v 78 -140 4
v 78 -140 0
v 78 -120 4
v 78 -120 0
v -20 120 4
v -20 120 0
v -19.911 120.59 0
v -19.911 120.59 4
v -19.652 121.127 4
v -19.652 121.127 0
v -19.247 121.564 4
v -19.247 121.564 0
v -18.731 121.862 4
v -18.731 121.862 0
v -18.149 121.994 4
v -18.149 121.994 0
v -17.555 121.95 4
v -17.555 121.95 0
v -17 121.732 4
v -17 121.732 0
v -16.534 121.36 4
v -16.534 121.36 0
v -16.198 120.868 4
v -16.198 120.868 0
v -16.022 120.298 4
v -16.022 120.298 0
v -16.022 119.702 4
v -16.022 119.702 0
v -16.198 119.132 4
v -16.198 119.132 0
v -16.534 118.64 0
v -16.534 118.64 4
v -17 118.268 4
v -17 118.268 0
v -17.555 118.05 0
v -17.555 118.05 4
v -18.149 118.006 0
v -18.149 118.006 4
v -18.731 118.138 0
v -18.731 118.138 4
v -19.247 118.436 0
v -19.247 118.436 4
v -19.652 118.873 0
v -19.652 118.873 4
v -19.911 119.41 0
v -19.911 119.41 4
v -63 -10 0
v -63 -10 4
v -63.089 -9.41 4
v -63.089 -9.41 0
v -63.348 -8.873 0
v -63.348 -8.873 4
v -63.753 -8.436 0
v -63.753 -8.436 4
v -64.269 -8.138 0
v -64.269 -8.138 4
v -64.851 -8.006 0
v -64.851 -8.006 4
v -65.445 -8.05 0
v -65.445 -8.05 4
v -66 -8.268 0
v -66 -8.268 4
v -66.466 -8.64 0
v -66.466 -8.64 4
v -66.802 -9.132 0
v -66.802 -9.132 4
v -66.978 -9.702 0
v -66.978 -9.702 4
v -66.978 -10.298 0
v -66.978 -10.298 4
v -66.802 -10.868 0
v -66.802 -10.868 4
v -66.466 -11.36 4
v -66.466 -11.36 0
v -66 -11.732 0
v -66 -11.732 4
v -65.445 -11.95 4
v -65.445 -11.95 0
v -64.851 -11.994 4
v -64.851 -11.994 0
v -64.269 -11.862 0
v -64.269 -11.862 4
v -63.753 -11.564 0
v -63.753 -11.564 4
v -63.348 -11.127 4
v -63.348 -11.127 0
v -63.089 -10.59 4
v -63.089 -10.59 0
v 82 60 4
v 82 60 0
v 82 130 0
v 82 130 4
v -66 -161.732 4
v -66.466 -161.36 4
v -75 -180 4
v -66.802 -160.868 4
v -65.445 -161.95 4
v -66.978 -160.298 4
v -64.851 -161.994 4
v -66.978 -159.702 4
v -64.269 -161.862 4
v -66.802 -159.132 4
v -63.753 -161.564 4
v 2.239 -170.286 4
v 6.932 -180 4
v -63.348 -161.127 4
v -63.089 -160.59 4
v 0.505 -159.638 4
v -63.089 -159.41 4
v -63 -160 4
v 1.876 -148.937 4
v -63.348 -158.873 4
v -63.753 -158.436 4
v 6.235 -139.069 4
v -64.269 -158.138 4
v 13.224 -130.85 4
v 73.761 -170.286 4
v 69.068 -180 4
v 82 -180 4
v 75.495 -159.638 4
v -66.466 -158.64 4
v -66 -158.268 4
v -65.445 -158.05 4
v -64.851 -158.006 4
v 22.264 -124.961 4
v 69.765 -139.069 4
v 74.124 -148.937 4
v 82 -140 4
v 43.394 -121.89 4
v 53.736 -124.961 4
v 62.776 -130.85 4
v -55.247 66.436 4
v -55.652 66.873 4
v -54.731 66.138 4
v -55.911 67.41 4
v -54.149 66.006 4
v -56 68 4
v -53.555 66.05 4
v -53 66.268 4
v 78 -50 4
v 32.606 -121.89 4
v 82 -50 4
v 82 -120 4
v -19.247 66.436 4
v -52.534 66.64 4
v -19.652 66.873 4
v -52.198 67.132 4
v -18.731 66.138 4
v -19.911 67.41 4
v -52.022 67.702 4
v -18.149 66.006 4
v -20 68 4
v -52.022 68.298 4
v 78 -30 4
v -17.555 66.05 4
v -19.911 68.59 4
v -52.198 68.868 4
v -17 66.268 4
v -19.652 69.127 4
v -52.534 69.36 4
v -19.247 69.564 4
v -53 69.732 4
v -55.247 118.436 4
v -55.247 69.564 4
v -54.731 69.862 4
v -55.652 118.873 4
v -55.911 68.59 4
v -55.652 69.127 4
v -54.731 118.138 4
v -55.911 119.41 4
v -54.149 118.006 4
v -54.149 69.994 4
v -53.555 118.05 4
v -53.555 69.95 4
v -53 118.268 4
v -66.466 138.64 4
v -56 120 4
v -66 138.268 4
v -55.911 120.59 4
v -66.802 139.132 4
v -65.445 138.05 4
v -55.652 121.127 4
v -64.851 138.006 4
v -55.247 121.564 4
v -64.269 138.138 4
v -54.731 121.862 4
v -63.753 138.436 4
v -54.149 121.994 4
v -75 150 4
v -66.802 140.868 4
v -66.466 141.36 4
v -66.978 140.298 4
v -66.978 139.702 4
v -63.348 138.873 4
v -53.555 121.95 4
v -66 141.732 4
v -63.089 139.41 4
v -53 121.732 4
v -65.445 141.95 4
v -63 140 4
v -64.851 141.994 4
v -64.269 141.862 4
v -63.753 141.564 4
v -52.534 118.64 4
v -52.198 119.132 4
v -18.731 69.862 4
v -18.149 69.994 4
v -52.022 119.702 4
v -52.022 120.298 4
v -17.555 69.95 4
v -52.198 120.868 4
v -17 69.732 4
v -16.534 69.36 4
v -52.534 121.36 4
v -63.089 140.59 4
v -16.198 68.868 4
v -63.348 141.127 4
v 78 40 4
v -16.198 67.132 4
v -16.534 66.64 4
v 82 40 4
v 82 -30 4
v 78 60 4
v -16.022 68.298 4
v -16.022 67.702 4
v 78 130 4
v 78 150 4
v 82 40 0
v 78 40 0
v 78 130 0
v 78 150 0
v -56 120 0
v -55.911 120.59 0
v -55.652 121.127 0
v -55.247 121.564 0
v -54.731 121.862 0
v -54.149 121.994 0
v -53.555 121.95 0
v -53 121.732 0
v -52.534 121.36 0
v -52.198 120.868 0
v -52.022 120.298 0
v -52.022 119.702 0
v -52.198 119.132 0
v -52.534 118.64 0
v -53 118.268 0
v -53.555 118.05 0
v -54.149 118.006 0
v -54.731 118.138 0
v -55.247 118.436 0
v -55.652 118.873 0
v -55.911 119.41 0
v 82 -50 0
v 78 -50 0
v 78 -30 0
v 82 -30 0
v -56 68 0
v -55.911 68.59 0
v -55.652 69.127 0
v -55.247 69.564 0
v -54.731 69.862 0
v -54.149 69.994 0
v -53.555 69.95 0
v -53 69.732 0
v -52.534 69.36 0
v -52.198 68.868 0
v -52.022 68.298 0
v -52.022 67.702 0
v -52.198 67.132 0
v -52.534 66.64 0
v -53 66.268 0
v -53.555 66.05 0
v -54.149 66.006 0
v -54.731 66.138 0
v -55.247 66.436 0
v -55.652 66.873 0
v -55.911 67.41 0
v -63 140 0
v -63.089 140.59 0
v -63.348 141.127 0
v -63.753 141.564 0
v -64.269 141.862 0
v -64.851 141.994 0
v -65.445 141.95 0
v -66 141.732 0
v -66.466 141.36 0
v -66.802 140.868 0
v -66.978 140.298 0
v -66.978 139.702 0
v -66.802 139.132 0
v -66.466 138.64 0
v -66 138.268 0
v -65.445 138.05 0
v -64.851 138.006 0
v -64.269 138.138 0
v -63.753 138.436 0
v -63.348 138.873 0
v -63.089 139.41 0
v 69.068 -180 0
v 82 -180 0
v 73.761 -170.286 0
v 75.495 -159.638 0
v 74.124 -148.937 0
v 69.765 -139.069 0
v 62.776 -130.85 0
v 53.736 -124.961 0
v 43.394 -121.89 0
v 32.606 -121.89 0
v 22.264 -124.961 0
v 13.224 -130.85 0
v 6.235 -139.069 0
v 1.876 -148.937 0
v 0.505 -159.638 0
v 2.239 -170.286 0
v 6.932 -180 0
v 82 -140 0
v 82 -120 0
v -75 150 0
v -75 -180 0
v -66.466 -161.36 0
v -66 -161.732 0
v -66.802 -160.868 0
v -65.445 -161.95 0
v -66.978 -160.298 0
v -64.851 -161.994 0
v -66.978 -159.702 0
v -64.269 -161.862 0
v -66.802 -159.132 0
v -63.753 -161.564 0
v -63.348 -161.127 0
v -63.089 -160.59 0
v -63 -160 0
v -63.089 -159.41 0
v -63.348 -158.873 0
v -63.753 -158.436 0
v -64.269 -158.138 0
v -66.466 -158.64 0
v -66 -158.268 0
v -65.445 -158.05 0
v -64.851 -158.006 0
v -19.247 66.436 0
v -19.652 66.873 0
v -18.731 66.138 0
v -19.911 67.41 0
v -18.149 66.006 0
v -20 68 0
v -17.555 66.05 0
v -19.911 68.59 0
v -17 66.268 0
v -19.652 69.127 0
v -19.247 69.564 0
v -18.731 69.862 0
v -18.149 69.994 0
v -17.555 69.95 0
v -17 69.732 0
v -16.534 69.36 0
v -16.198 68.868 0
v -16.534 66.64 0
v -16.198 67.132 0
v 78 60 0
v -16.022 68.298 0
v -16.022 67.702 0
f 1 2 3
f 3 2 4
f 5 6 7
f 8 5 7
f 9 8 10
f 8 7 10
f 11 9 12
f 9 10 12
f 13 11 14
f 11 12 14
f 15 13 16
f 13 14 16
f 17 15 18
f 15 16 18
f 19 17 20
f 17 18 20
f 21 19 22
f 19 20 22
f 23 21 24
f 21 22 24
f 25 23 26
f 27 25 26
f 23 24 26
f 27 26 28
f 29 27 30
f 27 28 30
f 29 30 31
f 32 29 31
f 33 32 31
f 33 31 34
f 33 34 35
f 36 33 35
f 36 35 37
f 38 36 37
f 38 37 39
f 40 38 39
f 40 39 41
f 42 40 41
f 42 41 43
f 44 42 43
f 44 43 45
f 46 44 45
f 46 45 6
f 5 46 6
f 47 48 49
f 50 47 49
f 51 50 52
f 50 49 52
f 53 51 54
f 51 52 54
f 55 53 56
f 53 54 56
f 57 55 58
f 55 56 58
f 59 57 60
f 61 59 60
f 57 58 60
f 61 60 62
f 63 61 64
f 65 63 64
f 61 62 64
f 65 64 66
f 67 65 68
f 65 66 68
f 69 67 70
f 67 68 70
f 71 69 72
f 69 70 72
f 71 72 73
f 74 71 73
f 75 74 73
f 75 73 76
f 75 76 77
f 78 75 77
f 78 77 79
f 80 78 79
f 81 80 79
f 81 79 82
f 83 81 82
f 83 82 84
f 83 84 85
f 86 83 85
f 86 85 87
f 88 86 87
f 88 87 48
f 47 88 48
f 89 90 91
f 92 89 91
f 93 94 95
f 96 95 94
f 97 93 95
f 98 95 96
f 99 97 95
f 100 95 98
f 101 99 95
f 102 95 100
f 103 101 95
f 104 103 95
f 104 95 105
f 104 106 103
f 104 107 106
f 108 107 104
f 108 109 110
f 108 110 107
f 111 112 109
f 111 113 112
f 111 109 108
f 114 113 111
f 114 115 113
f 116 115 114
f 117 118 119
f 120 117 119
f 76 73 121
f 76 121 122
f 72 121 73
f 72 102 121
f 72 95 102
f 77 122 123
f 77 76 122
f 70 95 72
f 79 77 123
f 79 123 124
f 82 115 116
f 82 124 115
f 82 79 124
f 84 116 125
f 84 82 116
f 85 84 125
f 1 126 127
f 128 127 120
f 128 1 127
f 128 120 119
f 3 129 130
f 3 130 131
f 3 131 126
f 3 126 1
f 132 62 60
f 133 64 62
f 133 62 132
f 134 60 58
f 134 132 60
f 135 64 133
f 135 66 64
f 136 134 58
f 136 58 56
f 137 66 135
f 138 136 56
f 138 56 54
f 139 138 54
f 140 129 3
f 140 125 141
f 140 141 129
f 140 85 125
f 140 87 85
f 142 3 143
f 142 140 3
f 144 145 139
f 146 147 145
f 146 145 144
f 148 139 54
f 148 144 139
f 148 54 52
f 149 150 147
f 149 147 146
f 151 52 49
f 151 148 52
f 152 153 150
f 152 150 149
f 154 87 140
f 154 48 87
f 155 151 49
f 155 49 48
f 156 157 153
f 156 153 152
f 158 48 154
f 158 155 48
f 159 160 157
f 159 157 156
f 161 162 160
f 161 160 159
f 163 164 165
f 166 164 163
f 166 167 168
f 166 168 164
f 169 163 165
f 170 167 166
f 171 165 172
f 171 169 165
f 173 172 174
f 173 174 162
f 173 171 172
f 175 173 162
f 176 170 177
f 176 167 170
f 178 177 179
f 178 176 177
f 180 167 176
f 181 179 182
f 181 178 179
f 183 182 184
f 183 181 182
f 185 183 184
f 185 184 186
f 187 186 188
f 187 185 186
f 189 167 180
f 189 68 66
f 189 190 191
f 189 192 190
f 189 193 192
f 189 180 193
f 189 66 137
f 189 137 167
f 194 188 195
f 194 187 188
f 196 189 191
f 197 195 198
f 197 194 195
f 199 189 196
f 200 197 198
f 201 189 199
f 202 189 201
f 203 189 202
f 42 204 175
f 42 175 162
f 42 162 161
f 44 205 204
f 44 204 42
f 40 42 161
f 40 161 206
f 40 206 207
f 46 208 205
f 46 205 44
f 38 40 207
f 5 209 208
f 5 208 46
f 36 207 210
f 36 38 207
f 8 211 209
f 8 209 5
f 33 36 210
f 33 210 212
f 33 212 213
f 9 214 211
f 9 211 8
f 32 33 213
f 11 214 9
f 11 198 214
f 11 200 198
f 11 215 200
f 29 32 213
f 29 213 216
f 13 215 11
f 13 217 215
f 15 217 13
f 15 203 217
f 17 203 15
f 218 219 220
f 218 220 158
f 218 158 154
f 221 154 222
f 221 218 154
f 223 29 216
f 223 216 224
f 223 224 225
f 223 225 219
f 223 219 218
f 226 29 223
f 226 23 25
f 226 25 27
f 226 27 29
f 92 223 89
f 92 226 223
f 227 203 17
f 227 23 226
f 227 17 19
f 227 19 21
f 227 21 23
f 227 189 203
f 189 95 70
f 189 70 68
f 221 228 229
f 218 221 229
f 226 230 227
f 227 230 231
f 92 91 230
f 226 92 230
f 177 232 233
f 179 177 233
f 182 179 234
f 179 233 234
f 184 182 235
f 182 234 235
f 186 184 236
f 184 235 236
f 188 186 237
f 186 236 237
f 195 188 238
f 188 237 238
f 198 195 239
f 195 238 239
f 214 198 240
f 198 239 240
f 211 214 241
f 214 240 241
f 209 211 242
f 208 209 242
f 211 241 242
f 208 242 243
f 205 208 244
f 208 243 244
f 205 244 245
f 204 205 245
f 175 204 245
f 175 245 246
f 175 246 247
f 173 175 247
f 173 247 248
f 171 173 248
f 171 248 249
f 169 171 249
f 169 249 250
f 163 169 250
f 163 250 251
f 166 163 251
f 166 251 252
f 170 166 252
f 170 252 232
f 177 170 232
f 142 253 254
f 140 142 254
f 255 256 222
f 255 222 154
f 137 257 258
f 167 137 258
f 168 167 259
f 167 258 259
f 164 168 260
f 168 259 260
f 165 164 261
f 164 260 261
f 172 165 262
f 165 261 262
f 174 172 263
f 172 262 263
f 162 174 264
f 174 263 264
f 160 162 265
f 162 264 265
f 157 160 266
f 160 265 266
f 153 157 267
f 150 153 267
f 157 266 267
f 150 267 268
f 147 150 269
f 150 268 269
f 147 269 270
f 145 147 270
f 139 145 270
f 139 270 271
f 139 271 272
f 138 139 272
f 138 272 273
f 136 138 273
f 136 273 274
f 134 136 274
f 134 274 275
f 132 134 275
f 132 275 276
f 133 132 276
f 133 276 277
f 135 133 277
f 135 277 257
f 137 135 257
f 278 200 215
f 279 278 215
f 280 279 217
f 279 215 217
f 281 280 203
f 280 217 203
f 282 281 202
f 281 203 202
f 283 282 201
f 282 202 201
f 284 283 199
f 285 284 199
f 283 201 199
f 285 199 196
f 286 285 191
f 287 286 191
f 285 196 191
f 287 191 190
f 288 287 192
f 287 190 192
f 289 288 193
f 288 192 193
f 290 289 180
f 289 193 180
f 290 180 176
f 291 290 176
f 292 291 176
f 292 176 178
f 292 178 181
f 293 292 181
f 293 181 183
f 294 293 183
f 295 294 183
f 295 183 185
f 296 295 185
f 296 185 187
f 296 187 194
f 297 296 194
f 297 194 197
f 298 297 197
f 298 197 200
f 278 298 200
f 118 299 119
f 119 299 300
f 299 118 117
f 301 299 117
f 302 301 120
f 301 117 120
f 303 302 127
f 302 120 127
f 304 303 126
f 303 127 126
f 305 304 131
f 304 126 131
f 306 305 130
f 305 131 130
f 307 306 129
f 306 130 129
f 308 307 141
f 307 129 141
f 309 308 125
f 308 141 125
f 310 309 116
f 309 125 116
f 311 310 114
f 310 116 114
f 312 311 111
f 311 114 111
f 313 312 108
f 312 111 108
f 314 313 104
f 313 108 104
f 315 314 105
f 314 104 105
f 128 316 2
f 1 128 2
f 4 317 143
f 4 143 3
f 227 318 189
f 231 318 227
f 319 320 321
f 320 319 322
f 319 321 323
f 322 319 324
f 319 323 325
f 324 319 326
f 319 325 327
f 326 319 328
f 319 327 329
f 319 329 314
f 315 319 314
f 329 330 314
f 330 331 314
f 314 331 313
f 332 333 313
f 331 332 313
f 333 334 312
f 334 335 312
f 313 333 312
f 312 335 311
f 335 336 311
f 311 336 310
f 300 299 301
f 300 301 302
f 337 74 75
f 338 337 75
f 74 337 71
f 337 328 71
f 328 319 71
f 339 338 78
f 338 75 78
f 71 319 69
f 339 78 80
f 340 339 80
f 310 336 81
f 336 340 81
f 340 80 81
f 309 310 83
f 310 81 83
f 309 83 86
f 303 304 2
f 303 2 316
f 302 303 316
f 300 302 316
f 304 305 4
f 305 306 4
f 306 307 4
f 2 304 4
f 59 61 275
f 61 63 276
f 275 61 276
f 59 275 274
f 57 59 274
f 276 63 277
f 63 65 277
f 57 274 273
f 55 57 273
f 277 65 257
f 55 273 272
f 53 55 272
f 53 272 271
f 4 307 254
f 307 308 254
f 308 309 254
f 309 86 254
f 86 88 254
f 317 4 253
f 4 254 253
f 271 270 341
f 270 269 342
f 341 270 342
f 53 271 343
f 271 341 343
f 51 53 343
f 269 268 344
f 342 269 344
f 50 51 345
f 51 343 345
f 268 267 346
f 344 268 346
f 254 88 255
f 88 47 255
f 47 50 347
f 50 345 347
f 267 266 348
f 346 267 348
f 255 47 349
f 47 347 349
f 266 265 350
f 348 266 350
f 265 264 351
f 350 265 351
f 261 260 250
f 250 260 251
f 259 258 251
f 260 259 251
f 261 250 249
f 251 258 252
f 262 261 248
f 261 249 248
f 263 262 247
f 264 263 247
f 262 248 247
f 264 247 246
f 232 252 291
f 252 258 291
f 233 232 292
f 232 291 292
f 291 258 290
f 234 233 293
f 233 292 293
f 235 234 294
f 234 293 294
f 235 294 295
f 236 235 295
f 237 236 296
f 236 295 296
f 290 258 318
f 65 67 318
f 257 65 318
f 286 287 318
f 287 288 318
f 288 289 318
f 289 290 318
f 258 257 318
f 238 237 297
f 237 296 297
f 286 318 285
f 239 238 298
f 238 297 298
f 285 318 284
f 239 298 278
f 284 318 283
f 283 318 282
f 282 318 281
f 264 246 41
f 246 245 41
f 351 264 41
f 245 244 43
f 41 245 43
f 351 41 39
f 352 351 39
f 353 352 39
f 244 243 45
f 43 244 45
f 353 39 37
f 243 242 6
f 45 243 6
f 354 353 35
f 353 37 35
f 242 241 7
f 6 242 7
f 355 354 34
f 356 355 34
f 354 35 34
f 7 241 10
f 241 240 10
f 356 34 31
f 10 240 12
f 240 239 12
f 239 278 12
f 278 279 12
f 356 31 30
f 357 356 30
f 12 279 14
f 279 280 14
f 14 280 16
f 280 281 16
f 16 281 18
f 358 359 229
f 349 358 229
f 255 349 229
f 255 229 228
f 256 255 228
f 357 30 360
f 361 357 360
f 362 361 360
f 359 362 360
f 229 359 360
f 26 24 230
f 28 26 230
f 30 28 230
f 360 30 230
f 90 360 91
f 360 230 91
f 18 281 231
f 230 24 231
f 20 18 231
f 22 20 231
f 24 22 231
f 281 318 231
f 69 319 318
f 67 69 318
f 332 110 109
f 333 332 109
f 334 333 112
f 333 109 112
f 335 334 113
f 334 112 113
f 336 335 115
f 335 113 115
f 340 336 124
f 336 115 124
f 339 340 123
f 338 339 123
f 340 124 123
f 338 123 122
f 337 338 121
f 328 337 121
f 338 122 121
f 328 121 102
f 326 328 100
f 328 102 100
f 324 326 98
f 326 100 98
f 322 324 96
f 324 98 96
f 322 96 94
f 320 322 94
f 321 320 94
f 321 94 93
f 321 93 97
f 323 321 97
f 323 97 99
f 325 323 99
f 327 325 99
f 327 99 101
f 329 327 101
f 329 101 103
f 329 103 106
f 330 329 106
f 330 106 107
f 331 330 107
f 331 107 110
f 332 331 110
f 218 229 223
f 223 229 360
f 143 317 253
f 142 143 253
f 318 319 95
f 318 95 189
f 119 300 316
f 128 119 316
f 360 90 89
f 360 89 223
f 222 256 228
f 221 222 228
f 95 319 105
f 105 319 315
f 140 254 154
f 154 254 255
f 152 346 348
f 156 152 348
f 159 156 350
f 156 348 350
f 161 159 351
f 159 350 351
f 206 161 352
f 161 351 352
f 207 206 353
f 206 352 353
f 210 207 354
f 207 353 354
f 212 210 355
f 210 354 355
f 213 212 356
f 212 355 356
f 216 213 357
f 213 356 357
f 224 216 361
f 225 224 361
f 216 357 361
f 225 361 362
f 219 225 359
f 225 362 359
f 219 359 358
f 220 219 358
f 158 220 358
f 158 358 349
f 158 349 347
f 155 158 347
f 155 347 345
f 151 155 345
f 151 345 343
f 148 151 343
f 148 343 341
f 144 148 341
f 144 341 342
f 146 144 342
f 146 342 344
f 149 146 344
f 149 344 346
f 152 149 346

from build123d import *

# Parameters (mm, degrees)
SKETCH1_W           = 165
SKETCH1_H           = 330
BOSS_EXTRUDE1_DEPTH = 4
SKETCH2_R           = 37.5
CUT_EXTRUDE1_DEPTH  = 202.285866369
SKETCH4_W           = 8
SKETCH4_H           = 300
CUT_EXTRUDE3_DEPTH  = 202.285866369
SKETCH3_W           = 4
SKETCH3_H           = 20
CUT_EXTRUDE2_DEPTH  = 202.285866369
SKETCH5_W           = 8
SKETCH5_H           = 30
CUT_EXTRUDE4_DEPTH  = 202.285866369
SKETCH6_R           = 2
CUT_EXTRUDE5_DEPTH  = 198.838317825
SKETCH7_R           = 2
CUT_EXTRUDE6_DEPTH  = 198.838317825


with BuildPart() as part:
    # Sketch1 → Boss-Extrude1 (new body)
    with BuildSketch(Plane.XY):
        with Locations((7.5, -15)):
            Rectangle(SKETCH1_W, SKETCH1_H)
    extrude(amount=BOSS_EXTRUDE1_DEPTH)

    # Sketch2 → Cut-Extrude1 (cut, through all)
    with BuildSketch(Plane.XY.offset(4)):
        with Locations((38, -159)):
            Circle(SKETCH2_R)
    extrude(amount=-CUT_EXTRUDE1_DEPTH, mode=Mode.SUBTRACT)

    # Sketch4 → Cut-Extrude3 (cut, through all)
    with BuildSketch(Plane(origin=(0, 0, 0), x_dir=(-1, 0, 0), z_dir=(0, 0, -1))):
        with Locations((-86, 0)):
            Rectangle(SKETCH4_W, SKETCH4_H)
    extrude(amount=-CUT_EXTRUDE3_DEPTH, mode=Mode.SUBTRACT)

    # Sketch3 → Cut-Extrude2 (cut, through all)
    with BuildSketch(Plane(origin=(0, 0, 0), x_dir=(-1, 0, 0), z_dir=(0, 0, -1))):
        with Locations((-80, 140)):
            Rectangle(SKETCH3_W, SKETCH3_H)
        with Locations((-80, 50)):
            Rectangle(SKETCH3_W, SKETCH3_H)
        with Locations((-80, -40)):
            Rectangle(SKETCH3_W, SKETCH3_H)
        with Locations((-80, -130)):
            Rectangle(SKETCH3_W, SKETCH3_H)
    extrude(amount=-CUT_EXTRUDE2_DEPTH, mode=Mode.SUBTRACT)

    # Sketch5 → Cut-Extrude4 (cut, through all)
    with BuildSketch(Plane.XY.offset(4)):
        with Locations((86, -165)):
            Rectangle(SKETCH5_W, SKETCH5_H)
    extrude(amount=-CUT_EXTRUDE4_DEPTH, mode=Mode.SUBTRACT)

    # Sketch6 → Cut-Extrude5 (cut, through all)
    with BuildSketch(Plane(origin=(0, 0, 0), x_dir=(-1, 0, 0), z_dir=(0, 0, -1))):
        with Locations((18, 120)):
            Circle(SKETCH6_R)
        with Locations((54, 120)):
            Circle(SKETCH6_R)
        with Locations((18, 68)):
            Circle(SKETCH6_R)
        with Locations((54, 68)):
            Circle(SKETCH6_R)
    extrude(amount=-CUT_EXTRUDE5_DEPTH, mode=Mode.SUBTRACT)

    # Sketch7 → Cut-Extrude6 (cut, through all)
    with BuildSketch(Plane.XY.offset(4)):
        with Locations((-65, 140)):
            Circle(SKETCH7_R)
        with Locations((-65, -10)):
            Circle(SKETCH7_R)
        with Locations((-65, -160)):
            Circle(SKETCH7_R)
    extrude(amount=-CUT_EXTRUDE6_DEPTH, mode=Mode.SUBTRACT)


solid = part.part
